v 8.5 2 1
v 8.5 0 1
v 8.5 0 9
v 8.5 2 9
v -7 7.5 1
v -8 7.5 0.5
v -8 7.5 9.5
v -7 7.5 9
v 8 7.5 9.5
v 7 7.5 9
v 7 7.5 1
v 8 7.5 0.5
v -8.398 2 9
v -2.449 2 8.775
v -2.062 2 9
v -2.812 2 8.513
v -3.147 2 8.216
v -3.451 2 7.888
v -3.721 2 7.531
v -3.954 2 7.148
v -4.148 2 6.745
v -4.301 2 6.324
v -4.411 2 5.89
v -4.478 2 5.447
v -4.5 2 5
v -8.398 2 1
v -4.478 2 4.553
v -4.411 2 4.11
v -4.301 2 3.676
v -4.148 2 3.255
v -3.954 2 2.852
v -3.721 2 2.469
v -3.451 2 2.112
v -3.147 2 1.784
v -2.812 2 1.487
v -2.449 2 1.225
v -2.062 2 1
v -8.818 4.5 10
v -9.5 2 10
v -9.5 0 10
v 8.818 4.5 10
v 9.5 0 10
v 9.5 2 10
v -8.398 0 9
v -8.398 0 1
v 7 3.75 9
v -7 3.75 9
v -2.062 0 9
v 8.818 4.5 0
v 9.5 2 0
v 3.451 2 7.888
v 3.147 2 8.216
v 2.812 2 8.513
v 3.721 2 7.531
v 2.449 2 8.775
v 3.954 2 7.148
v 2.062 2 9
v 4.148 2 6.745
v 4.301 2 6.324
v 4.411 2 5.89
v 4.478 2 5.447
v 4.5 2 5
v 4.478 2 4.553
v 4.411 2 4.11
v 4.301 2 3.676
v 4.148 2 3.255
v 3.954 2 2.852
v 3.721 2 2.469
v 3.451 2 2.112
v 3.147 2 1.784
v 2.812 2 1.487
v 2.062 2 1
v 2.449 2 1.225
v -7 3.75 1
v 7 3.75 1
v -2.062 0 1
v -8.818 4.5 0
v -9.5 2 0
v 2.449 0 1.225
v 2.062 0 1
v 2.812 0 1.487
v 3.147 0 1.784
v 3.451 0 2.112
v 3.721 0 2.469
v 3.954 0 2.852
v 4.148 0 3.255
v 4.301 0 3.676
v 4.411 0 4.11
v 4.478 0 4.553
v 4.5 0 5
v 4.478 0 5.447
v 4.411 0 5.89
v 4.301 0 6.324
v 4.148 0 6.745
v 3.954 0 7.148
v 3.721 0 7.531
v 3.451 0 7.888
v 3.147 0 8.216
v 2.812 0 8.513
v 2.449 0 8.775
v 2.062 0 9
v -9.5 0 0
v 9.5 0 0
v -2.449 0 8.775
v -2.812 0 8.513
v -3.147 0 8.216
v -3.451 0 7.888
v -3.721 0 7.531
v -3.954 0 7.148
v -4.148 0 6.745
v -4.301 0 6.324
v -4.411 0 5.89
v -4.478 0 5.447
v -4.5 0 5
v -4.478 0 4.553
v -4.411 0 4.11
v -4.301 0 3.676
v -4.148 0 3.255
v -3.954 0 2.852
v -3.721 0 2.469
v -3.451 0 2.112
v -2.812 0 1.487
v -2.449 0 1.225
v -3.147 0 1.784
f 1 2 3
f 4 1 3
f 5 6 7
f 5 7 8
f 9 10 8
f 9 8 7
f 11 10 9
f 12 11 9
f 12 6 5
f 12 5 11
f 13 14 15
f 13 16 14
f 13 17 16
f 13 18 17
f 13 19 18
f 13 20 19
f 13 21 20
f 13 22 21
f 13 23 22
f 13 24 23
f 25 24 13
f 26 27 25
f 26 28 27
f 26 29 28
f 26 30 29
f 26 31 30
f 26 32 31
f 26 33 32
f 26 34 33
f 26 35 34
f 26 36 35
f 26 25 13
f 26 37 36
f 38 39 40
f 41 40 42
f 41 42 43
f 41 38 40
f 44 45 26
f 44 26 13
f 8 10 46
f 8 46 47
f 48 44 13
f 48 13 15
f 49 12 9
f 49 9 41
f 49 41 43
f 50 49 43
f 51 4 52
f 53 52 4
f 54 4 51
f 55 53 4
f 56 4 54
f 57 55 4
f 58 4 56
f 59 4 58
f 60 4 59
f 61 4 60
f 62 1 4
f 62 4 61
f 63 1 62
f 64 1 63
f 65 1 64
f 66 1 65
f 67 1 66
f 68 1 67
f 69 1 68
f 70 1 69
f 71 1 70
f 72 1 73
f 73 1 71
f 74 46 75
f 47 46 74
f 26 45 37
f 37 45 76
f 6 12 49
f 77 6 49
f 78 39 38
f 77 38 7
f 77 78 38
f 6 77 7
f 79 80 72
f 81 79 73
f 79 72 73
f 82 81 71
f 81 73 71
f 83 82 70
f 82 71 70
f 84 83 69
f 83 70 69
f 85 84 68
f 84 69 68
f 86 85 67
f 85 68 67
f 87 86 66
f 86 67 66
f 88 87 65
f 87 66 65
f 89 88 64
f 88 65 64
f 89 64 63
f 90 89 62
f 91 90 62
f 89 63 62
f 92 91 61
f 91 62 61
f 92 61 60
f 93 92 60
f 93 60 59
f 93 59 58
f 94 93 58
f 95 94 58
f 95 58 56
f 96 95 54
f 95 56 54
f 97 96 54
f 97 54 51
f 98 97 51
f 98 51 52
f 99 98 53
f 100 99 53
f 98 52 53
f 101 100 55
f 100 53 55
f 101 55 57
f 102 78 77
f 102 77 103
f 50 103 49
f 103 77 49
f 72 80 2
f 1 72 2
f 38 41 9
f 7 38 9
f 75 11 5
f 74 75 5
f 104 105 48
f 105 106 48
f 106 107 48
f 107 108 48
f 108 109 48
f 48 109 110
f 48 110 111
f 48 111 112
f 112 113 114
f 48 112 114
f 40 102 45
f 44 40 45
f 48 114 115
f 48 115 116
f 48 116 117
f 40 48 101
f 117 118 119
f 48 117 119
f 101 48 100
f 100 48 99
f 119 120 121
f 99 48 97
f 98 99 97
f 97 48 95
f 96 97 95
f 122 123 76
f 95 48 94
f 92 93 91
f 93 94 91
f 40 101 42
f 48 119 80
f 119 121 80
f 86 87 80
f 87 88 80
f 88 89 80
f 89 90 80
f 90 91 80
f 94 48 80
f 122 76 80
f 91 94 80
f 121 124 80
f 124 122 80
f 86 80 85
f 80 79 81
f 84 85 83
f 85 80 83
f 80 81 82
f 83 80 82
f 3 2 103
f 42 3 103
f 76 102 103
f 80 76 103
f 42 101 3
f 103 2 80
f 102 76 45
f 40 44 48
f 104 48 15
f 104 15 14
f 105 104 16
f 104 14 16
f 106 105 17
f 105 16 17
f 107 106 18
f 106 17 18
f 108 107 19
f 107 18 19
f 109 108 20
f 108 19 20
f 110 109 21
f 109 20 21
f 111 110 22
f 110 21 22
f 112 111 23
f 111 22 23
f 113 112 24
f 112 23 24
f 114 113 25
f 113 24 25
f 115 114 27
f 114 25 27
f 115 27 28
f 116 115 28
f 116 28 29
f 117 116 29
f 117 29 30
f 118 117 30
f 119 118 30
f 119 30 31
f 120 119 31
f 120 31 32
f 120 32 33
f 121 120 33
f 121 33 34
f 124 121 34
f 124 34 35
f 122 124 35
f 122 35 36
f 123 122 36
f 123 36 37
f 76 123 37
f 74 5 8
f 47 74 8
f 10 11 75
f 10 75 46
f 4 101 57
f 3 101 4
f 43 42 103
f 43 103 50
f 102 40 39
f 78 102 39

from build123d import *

# Parameters (mm, degrees)
SKETCH005_W      = 16.898421
SKETCH005_H      = 8
EXTRUDE004_DEPTH = 2.5
SKETCH_W         = 19
SKETCH_H         = 2
EXTRUDE_DEPTH    = 10
SKETCH012_R      = 4.5
EXTRUDE009_DEPTH = 2
EXTRUDE008_DEPTH = 19
SKETCH003_W      = 14
SKETCH003_H      = 8
EXTRUDE002_DEPTH = 3.75
EXTRUDE001_DEPTH = 10


with BuildPart() as extrude004:
    # Sketch005 (on Face2 of Extrude) → Extrude004 (new body, symmetric)
    with BuildSketch(Plane.XZ):
        with Locations((0.05079, 5)):
            Rectangle(SKETCH005_W, SKETCH005_H)
    extrude(amount=EXTRUDE004_DEPTH, both=True)


with BuildPart() as cut001:
    # Sketch → Extrude (new body)
    with BuildSketch(Plane.XY):
        with Locations((0, 1)):
            Rectangle(SKETCH_W, SKETCH_H)
    extrude(amount=EXTRUDE_DEPTH)

    # Cut001: cut Extrude004
    add(extrude004.part, mode=Mode.SUBTRACT)


with BuildPart() as extrude009:
    # Sketch012 (on Face7 of Common) → Extrude009 (new body)
    with BuildSketch(Plane.XZ.offset(-2)):
        with Locations((0, 5)):
            Circle(SKETCH012_R)
    extrude(amount=EXTRUDE009_DEPTH)


with BuildPart() as extrude008:
    # Sketch011 (on Face1 of Cut001) → Extrude008 (new body)
    with BuildSketch(Plane(origin=(-9.5, 0, 0), x_dir=(0, -1, 0), z_dir=(-1, 0, 0))):
        Polygon((-1.5, 10.5), (-7.5, 9.5), (-7.5, 0.5), (-1.5, -0.5), align=None)
    extrude(amount=-EXTRUDE008_DEPTH)


with BuildPart() as extrude002:
    # Sketch003 (on Face2 of Extrude001) → Extrude002 (new body, symmetric)
    with BuildSketch(Plane(origin=(0, 7.5, 0), x_dir=(-1, 0, 0), z_dir=(0, 1, 0))):
        with Locations((0, 5)):
            Rectangle(SKETCH003_W, SKETCH003_H)
    extrude(amount=EXTRUDE002_DEPTH, both=True)


with BuildPart() as fusion002:
    # Sketch001 → Extrude001 (new body)
    with BuildSketch(Plane.XY):
        Polygon((-9.5, 2), (-8, 7.5), (8, 7.5), (9.5, 2), align=None)
    extrude(amount=EXTRUDE001_DEPTH)

    # Cut: cut Extrude002
    add(extrude002.part, mode=Mode.SUBTRACT)

    # Common: intersect Extrude008
    add(extrude008.part, mode=Mode.INTERSECT)

    # Fusion001: union Extrude009
    add(extrude009.part)

    # Fusion002: union Cut001
    add(cut001.part)


solid = fusion002.part
